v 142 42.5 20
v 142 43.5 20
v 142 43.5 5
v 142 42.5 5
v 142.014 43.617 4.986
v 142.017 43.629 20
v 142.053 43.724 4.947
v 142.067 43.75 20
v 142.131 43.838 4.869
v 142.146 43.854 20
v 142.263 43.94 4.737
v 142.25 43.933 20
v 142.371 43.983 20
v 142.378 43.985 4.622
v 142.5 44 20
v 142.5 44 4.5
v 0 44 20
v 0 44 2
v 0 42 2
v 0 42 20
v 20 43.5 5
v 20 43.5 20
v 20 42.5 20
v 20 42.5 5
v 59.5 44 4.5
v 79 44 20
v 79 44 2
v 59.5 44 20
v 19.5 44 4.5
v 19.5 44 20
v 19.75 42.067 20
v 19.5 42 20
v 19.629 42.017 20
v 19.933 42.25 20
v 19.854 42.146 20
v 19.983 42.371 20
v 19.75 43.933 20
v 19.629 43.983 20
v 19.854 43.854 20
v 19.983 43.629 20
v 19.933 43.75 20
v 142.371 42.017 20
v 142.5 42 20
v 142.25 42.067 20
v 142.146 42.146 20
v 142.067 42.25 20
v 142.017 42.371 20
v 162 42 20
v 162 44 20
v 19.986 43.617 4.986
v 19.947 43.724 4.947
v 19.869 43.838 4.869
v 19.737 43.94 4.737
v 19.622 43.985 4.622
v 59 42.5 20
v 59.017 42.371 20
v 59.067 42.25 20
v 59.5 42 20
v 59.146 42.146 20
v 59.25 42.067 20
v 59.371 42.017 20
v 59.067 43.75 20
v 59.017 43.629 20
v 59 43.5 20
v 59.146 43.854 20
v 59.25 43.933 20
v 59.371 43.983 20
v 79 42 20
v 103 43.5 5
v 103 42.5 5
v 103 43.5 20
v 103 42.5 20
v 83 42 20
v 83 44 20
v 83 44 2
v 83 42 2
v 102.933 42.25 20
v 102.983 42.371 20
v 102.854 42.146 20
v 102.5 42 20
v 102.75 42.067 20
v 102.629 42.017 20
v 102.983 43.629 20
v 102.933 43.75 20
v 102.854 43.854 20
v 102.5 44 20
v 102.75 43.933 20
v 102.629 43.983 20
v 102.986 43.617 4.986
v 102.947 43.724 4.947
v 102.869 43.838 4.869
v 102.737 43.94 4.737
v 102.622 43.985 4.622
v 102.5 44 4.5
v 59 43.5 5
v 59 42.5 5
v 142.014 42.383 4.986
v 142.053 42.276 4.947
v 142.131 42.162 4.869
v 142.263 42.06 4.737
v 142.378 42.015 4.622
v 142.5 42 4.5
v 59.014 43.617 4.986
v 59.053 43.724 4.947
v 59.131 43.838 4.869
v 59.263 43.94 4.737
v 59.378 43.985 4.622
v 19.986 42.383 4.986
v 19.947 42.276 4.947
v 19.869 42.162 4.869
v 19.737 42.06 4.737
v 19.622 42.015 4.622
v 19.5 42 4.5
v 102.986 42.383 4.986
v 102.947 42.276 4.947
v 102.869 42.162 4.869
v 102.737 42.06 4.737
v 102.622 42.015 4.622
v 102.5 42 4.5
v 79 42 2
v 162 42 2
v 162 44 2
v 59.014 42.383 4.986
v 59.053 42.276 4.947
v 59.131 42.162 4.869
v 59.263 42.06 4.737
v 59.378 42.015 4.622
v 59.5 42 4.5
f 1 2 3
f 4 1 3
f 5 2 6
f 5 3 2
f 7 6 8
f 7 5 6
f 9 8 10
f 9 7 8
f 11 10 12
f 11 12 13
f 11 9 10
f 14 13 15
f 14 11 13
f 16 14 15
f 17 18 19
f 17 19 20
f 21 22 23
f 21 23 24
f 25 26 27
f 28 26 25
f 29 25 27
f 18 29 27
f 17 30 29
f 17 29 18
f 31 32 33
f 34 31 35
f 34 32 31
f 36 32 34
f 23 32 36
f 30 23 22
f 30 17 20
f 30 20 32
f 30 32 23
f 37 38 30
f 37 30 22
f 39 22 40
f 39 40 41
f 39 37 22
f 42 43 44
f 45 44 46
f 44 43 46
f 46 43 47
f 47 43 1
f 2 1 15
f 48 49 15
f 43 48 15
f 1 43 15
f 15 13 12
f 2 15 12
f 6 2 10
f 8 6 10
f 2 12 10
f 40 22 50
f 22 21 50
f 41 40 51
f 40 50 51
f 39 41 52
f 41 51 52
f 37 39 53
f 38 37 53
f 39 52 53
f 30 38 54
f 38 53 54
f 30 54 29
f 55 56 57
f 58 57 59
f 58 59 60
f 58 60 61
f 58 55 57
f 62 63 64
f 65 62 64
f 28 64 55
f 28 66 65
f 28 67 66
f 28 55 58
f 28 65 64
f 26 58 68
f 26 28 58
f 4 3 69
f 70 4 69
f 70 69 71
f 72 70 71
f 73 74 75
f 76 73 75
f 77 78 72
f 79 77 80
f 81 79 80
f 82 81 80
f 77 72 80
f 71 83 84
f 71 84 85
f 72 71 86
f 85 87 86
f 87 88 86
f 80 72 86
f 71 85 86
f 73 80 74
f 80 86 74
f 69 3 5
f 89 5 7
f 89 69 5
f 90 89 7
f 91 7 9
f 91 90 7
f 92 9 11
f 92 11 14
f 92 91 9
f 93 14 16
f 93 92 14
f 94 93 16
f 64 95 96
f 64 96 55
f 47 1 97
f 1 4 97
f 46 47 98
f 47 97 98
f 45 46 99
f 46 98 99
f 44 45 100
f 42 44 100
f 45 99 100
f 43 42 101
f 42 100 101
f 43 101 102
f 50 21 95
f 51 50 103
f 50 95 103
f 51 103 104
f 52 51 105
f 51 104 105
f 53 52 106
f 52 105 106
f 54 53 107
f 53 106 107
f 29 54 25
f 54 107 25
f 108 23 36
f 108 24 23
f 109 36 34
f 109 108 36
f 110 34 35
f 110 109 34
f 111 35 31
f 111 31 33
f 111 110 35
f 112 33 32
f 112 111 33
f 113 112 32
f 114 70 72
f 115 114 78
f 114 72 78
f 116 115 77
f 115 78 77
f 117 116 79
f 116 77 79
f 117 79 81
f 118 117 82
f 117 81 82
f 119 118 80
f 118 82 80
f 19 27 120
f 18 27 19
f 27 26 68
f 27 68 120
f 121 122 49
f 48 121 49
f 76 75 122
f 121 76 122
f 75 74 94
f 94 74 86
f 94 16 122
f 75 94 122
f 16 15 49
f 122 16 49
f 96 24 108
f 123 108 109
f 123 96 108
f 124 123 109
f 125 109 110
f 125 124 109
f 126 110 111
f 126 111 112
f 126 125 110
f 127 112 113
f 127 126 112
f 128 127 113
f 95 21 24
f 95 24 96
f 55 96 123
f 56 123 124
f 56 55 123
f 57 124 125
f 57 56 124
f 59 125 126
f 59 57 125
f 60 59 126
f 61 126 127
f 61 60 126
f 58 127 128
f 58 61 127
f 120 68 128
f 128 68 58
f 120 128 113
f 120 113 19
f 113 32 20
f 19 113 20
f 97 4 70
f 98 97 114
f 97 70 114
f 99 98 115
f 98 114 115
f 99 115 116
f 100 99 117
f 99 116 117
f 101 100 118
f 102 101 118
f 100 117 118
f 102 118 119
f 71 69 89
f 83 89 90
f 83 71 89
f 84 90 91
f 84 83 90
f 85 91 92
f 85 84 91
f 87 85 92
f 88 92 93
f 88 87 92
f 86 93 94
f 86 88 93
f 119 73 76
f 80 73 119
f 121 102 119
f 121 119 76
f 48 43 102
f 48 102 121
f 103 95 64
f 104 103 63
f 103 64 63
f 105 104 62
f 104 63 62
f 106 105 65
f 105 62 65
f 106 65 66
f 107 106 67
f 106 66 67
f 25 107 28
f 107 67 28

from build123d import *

# Parameters (mm, degrees)
EXTRUDE008_DEPTH = 2
FILLET005_R      = 0.5


with BuildPart() as front_side001:
    # Sketch021 → Extrude008 (new body)
    with BuildSketch(Plane.XZ):
        Polygon((0, 2), (0, 20), (20, 20), (20, 5), (59, 5), (59, 20), (79, 20), (79, 2), align=None)
        Polygon((162, 2), (162, 20), (142, 20), (142, 5), (103, 5), (103, 20), (83, 20), (83, 2), align=None)
    extrude(amount=-EXTRUDE008_DEPTH)


with BuildPart() as back_row001:
    # Part__Mirroring002: instance of front side001
    add(front_side001.part.mirror(Plane(origin=(0, 0, 0), x_dir=(1, 0, 0), z_dir=(0, 1, 0))))


with BuildPart() as back_row001_1:
    # Part__Mirroring002 placement: moved
    add(back_row001.part.moved(Location((0, 44, 0))))

    # Fillet005
    fillet005_edges = [back_row001_1.edges().sort_by_distance(p)[0] for p in [
        (142, 44, 12.5),
        (142, 42, 12.5),
        (122.5, 44, 5),
        (122.5, 42, 5),
        (103, 44, 12.5),
        (103, 42, 12.5),
        (20, 44, 12.5),
        (20, 42, 12.5),
        (39.5, 44, 5),
        (39.5, 42, 5),
        (59, 44, 12.5),
        (59, 42, 12.5),
    ]]
    fillet(fillet005_edges, radius=FILLET005_R)


solid = back_row001_1.part
